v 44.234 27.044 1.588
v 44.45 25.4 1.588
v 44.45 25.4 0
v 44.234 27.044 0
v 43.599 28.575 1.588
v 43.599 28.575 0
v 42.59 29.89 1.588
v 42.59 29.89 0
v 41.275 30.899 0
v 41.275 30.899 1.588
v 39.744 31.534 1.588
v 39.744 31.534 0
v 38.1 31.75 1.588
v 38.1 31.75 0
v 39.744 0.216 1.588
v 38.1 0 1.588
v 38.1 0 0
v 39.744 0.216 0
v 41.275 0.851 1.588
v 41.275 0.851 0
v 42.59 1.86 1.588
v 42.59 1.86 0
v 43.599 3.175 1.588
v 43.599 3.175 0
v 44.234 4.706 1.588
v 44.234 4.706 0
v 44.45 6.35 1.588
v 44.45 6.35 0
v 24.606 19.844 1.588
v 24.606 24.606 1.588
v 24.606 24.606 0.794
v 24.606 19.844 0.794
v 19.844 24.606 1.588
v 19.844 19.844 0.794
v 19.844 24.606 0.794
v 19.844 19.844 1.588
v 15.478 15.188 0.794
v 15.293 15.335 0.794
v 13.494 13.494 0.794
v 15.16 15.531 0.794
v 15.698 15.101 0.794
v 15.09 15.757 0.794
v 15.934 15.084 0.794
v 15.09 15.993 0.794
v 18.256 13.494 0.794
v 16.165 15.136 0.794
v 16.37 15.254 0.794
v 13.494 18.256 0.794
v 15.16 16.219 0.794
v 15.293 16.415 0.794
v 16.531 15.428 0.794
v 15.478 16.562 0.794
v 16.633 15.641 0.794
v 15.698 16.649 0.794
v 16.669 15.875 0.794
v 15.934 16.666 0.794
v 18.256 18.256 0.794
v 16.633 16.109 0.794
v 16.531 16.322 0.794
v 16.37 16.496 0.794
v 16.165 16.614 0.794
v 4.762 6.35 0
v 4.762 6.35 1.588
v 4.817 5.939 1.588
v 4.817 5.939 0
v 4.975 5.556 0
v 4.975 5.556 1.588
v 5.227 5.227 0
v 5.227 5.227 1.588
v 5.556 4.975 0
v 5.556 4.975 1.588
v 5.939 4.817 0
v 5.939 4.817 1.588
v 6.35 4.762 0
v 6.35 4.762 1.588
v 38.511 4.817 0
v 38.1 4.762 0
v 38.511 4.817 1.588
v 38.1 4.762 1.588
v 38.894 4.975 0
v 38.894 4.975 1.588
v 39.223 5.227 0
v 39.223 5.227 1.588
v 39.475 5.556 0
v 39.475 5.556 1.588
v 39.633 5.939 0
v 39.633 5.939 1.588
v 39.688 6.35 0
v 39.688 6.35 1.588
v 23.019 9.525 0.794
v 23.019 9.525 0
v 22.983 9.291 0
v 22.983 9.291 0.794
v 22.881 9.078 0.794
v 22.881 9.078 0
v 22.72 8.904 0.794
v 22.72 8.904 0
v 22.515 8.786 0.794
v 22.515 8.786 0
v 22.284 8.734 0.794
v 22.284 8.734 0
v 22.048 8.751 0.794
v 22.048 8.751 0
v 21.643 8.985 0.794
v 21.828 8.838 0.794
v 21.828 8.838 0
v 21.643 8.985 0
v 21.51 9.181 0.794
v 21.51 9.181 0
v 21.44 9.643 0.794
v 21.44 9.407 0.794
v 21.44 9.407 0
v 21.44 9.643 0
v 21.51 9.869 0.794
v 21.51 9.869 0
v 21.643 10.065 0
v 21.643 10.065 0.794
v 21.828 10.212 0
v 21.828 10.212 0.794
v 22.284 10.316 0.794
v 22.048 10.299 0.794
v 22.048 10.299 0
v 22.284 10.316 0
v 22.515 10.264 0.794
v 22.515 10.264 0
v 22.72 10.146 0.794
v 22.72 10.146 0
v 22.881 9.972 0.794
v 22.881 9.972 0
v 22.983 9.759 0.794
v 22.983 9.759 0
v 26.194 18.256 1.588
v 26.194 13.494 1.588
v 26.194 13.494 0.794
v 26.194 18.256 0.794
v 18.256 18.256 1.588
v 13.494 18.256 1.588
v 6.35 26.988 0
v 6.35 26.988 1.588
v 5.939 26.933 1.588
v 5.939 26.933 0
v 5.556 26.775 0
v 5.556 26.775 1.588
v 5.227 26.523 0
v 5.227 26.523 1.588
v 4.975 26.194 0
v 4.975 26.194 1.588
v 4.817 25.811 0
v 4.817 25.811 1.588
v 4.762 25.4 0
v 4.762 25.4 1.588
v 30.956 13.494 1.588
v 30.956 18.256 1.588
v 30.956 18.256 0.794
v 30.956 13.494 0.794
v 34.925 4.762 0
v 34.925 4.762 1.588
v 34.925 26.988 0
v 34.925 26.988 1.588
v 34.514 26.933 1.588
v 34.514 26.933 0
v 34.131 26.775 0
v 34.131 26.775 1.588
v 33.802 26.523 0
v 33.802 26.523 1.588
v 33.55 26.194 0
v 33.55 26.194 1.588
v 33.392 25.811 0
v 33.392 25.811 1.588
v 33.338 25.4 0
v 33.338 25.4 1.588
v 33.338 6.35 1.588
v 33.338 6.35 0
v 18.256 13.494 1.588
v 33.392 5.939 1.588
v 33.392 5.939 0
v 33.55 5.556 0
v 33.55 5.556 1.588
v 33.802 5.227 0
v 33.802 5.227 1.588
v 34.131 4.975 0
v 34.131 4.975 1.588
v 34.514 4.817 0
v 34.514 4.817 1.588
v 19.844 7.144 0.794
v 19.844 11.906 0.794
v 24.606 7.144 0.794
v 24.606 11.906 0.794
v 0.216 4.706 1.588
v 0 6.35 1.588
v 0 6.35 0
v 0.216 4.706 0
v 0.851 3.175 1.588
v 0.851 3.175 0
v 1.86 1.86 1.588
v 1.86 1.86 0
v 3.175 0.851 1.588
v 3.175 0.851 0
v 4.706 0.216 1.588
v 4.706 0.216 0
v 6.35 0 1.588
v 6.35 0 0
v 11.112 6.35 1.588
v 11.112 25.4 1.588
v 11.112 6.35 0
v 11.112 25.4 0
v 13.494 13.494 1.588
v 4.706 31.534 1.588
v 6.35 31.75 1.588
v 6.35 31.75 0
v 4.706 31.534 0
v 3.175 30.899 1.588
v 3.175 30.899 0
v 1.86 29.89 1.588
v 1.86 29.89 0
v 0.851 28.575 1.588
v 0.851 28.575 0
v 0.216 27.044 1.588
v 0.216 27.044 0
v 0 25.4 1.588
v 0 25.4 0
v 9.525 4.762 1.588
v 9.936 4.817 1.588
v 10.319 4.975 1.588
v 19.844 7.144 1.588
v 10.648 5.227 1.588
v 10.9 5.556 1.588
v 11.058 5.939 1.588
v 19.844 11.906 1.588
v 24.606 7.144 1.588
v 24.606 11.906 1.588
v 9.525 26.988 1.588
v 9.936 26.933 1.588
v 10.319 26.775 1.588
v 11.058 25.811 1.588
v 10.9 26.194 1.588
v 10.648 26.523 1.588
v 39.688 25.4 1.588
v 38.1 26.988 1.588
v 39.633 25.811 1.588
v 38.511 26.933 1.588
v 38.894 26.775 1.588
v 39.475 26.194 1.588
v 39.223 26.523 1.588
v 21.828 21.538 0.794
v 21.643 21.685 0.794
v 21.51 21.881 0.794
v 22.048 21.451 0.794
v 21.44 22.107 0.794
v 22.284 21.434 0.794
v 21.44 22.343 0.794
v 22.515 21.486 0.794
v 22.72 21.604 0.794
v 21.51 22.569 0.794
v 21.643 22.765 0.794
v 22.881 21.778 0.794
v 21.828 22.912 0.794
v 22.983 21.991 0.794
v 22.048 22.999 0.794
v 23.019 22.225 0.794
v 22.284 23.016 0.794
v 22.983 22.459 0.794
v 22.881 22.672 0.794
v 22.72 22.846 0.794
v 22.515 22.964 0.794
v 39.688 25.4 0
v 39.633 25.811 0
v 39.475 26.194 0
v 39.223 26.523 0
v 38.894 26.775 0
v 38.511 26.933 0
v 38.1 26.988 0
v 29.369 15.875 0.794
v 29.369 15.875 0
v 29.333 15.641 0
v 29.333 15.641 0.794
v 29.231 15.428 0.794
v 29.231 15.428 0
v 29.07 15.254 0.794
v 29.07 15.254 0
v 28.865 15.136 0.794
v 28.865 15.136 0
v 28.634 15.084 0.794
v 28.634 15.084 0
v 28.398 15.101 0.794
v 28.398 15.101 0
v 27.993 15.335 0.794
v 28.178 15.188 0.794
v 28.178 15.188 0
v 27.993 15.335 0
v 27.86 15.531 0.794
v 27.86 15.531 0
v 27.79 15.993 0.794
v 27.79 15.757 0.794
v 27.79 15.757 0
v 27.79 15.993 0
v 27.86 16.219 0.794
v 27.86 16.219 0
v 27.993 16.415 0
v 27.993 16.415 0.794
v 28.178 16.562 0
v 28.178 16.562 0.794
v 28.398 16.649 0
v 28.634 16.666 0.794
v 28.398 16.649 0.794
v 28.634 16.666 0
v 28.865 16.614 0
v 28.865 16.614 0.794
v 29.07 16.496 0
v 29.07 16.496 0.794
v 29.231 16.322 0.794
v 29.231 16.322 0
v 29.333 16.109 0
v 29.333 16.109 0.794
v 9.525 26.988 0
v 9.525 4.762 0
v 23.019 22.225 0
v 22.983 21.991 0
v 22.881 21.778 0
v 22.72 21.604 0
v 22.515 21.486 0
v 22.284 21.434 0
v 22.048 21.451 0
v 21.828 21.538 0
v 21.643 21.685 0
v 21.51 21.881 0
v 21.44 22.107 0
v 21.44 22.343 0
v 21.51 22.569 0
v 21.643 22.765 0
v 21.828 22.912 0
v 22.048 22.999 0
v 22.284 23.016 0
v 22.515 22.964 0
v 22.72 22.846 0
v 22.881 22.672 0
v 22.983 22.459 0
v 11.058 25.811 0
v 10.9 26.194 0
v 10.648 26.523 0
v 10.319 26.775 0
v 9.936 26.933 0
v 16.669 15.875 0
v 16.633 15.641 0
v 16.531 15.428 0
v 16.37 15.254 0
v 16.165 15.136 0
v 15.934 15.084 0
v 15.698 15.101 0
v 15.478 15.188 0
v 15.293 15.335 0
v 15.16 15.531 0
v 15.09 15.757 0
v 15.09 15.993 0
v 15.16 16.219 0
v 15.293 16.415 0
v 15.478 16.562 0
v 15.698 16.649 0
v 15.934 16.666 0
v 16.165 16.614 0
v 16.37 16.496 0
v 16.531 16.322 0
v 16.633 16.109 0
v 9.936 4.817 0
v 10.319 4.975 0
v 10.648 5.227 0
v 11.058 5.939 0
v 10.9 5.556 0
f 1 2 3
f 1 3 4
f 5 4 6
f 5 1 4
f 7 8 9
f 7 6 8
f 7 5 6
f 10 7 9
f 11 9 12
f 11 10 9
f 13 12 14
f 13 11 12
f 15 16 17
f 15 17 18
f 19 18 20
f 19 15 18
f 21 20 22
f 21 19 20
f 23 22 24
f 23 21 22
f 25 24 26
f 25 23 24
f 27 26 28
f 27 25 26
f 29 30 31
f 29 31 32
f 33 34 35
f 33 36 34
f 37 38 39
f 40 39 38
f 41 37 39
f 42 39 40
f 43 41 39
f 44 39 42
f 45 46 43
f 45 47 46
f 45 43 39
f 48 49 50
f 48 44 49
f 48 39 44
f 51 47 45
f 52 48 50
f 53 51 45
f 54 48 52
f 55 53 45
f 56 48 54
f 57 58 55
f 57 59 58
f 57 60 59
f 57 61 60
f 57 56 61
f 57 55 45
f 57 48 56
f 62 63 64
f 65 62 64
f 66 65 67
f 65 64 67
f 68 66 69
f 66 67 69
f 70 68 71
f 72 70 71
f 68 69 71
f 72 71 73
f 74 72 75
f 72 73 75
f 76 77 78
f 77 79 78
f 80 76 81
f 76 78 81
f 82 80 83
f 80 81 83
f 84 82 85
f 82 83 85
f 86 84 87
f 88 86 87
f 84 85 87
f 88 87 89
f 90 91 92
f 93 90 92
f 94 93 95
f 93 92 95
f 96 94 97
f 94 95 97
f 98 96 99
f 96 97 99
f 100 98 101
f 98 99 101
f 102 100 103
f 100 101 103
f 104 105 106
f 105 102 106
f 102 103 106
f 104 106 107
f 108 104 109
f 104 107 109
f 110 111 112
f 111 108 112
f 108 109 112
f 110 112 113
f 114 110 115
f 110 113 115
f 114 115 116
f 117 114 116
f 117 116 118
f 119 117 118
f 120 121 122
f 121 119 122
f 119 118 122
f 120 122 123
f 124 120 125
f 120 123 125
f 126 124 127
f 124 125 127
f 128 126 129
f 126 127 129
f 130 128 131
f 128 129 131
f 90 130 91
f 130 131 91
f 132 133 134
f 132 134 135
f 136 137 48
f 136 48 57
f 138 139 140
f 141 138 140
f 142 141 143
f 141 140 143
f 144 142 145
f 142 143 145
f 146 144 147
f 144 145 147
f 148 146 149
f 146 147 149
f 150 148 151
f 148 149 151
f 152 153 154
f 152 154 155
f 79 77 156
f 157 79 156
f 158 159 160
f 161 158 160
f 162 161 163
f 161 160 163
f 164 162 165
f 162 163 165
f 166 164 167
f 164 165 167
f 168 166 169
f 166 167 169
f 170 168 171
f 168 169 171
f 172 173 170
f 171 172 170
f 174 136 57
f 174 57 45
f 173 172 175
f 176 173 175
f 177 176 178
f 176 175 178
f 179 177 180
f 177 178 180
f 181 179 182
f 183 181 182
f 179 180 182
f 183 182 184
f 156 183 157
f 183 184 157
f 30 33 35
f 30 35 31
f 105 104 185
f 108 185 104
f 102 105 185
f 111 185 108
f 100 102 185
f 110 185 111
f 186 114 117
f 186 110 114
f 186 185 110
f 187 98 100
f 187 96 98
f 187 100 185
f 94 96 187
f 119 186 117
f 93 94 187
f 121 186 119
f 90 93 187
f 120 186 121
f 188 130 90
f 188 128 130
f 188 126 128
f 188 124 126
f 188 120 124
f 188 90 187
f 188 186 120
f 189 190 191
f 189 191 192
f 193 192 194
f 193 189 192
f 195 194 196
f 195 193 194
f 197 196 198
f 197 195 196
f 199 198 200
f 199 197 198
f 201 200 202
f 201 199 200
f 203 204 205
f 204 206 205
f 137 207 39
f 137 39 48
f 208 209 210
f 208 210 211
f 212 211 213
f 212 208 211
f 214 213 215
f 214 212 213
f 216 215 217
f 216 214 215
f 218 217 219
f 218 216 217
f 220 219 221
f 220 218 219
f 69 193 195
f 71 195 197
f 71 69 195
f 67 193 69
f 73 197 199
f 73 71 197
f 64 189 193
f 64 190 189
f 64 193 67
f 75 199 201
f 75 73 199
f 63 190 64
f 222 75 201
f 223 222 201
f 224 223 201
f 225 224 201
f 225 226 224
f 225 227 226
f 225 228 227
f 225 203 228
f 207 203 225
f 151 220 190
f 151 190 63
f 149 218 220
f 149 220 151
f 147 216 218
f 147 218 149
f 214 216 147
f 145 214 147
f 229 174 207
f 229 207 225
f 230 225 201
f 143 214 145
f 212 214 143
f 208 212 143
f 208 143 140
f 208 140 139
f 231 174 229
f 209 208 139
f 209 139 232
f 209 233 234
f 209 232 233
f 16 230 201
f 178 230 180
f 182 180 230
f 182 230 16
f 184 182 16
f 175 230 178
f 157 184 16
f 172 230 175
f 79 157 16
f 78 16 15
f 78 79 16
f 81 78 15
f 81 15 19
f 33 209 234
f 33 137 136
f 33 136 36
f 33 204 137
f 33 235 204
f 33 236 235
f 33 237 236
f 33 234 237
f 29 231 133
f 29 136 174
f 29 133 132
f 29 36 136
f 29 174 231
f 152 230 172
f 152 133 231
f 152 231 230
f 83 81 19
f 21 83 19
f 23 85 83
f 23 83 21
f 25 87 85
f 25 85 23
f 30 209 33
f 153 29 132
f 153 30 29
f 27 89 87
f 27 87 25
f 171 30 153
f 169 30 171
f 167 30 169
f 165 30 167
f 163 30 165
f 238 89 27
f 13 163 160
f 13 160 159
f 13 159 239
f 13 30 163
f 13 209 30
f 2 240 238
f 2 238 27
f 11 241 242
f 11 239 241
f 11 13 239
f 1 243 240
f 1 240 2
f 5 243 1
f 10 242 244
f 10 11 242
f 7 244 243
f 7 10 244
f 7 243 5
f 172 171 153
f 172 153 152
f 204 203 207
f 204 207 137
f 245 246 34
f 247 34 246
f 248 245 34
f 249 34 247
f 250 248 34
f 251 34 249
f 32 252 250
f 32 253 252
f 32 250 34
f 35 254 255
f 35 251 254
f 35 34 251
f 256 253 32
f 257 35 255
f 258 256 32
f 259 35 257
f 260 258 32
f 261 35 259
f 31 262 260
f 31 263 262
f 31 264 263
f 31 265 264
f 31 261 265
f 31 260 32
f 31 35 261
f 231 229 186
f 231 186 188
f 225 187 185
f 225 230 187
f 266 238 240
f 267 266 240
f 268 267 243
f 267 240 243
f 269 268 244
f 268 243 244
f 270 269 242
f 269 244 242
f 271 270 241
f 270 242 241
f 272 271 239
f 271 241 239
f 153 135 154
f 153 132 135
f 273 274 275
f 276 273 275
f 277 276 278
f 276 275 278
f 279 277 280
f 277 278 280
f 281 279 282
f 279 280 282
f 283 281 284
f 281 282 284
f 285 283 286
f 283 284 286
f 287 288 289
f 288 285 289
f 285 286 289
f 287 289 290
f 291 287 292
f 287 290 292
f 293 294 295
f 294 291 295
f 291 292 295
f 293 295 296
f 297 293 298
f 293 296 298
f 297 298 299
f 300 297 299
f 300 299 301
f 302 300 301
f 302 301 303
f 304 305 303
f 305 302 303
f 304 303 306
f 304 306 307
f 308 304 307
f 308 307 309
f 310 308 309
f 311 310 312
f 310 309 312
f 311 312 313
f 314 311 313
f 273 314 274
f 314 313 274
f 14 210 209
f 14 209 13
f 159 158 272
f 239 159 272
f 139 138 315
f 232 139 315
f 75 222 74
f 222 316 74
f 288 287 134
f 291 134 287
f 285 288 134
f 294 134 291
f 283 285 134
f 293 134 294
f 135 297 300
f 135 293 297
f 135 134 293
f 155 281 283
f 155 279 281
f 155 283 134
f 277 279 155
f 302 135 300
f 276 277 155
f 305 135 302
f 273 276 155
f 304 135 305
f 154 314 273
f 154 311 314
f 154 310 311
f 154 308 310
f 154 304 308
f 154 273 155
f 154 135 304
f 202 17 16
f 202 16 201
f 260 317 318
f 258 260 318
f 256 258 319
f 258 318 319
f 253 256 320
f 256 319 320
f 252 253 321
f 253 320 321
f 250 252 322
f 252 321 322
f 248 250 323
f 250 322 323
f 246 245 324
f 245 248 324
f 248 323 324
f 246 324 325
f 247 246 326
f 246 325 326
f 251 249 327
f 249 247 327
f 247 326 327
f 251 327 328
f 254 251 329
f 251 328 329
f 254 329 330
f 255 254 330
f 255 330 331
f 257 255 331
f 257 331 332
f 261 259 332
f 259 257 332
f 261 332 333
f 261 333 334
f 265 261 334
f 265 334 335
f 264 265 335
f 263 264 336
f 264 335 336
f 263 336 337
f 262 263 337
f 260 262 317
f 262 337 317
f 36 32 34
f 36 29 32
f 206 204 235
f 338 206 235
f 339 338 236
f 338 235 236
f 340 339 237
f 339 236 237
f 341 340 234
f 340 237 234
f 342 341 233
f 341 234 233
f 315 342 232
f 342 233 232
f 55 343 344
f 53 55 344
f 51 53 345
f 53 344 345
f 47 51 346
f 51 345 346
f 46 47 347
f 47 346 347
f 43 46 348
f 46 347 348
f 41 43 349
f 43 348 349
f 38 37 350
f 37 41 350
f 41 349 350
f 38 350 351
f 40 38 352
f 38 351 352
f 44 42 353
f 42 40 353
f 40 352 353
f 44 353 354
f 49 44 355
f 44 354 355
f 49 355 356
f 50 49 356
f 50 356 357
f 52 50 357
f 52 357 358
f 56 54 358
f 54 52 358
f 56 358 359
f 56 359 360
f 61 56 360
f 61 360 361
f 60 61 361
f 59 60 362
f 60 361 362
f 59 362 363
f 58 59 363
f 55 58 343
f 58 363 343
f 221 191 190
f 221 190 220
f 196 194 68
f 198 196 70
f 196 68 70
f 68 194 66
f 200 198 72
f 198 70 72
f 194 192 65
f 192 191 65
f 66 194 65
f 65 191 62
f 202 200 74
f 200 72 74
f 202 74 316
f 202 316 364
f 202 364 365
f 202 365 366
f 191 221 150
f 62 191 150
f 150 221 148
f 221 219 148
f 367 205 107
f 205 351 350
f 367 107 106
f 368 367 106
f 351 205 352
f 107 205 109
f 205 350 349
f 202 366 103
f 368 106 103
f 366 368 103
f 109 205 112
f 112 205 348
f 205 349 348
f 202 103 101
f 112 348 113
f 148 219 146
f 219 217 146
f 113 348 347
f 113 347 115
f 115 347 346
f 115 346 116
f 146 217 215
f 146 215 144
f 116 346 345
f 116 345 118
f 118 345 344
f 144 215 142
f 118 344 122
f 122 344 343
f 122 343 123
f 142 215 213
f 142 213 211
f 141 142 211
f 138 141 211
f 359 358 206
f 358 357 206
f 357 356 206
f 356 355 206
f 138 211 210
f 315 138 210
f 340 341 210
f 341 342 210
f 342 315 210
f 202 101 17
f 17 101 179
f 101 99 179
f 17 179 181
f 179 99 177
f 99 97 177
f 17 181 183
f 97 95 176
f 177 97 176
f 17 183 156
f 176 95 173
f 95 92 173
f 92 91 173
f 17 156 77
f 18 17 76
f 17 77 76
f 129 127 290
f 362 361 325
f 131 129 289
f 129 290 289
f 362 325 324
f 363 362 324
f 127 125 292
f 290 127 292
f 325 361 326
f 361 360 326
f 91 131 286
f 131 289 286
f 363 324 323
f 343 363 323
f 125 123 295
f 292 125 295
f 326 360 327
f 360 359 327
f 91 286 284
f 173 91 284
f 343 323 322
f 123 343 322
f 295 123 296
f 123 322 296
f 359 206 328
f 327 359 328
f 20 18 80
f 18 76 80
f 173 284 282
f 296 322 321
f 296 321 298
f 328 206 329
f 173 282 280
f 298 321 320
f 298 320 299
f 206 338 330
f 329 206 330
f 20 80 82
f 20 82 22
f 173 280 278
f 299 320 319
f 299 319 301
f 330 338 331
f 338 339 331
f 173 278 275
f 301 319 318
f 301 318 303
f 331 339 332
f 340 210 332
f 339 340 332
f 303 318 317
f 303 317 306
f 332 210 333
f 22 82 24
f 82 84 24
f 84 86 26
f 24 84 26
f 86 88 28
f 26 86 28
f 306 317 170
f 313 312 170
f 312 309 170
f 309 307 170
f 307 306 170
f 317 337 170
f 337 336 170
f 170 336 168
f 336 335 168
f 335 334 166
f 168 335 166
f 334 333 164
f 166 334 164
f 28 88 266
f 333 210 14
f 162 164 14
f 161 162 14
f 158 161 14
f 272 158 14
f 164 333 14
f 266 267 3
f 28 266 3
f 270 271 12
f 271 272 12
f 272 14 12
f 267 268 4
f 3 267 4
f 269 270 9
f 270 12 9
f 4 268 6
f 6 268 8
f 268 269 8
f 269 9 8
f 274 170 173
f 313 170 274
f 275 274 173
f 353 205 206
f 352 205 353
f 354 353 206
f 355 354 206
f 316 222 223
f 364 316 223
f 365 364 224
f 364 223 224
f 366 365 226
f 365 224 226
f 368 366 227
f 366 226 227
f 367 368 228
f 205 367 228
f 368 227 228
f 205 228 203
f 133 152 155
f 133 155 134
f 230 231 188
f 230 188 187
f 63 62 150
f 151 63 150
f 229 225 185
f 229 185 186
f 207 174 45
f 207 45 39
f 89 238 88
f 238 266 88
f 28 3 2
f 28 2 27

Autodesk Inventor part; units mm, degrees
ref_plane "YZ Plane" through (0, 0, 0) normal (1, 0, 0) x (0, 1, 0)
ref_plane "XZ Plane" through (0, 0, 0) normal (0, 1, 0) x (-1, 0, 0)
ref_plane "XY Plane" through (0, 0, 0) normal (0, 0, 1) x (1, 0, 0)
sketch "Sketch2" plane through (0, 0, 0) normal (0, 0, 1) x (1, 0, 0)
  line L0 (0, 31.75) -> (44.45, 31.75)
  line L1 (44.45, 31.75) -> (44.45, 0)
  line L2 (44.45, 0) -> (0, 0)
  line L3 (0, 0) -> (0, 31.75)
  circle A0 centre (22.225, 22.225) radius 0.7937
  circle A1 centre (22.225, 9.525) radius 0.7937
  circle A2 centre (28.575, 15.875) radius 0.7937
  circle A3 centre (15.875, 15.875) radius 0.7937
  line L4 (4.7625, 26.9875) -> (11.1125, 26.9875)
  line L5 (11.1125, 26.9875) -> (11.1125, 4.7625)
  line L6 (11.1125, 4.7625) -> (4.7625, 4.7625)
  line L7 (4.7625, 4.7625) -> (4.7625, 26.9875)
  line L8 (33.3375, 26.9875) -> (39.6875, 26.9875)
  line L9 (39.6875, 26.9875) -> (39.6875, 4.7625)
  line L10 (39.6875, 4.7625) -> (33.3375, 4.7625)
  line L11 (33.3375, 4.7625) -> (33.3375, 26.9875)
  dimension "d9" = 44.45
  dimension "d10" = 31.75
  dimension "d11" = 1.5875
  dimension "d12" = 1.5875
  dimension "d13" = 1.5875
  dimension "d14" = 1.5875
  dimension "d15" = 12.7
  dimension "d16" = 12.7
  dimension "d17" = 15.875
  dimension "d18" = 22.225
  dimension "d21" = 6.35
  dimension "d22" = 6.35
  dimension "d26" = 4.7625
  dimension "d27" = 4.7625
  dimension "d28" = 4.7625
  dimension "d29" = 4.7625
  dimension "d30" = 4.7625
  dimension "d31" = 4.7625
extrude "Extrusion4" add sketch "Sketch2" along normal blind 1.5875
fillet "Fillet2" radius 6.35 4 edges at (0, 31.75, 0.7937) (0, 0, 0.7937) (44.45, 0, 0.7937) (44.45, 31.75, 0.7937)
fillet "Fillet3" radius 1.5875 8 edges at (4.7625, 4.7625, 0.7937) (11.1125, 4.7625, 0.7937) (33.3375, 4.7625, 0.7937) (4.7625, 26.9875, 0.7937) (11.1125, 26.9875, 0.7937) (39.6875, 26.9875, 0.7937) (33.3375, 26.9875, 0.7937) (39.6875, 4.7625, 0.7937)
sketch "Sketch3" plane through (0, 0, 1.5875) normal (0, 0, 1) x (1, 0, 0)
  line L0 (13.4937, 18.2563) -> (18.2562, 18.2563)
  line L1 (18.2562, 18.2563) -> (18.2562, 13.4938)
  line L2 (18.2562, 13.4938) -> (13.4937, 13.4938)
  line L3 (13.4937, 13.4938) -> (13.4937, 18.2563)
  circle A0 centre (15.875, 15.875) radius 0.7937 projected
  line L4 (19.8437, 24.6063) -> (24.6062, 24.6063)
  line L5 (24.6062, 24.6063) -> (24.6062, 19.8438)
  line L6 (24.6062, 19.8438) -> (19.8437, 19.8438)
  line L7 (19.8437, 19.8438) -> (19.8437, 24.6063)
  line L8 (26.1937, 18.2563) -> (30.9562, 18.2563)
  line L9 (30.9562, 18.2563) -> (30.9562, 13.4938)
  line L10 (30.9562, 13.4938) -> (26.1937, 13.4938)
  line L11 (26.1937, 13.4938) -> (26.1937, 18.2563)
  line L12 (19.8437, 11.9063) -> (24.6062, 11.9063)
  line L13 (24.6062, 11.9063) -> (24.6062, 7.1438)
  line L14 (24.6062, 7.1438) -> (19.8437, 7.1438)
  line L15 (19.8437, 7.1438) -> (19.8437, 11.9063)
  circle A1 centre (22.225, 22.225) radius 0.7937 projected
  circle A2 centre (28.575, 15.875) radius 0.7937 projected
  circle A3 centre (22.225, 9.525) radius 0.7937 projected
  point P0 (0, 0)
  dimension "d36" = 4.7625
  dimension "d37" = 2.3813
  dimension "d38" = 2.3813
  dimension "d39" = 4.7625
  dimension "d41" = 2.3813
  dimension "d42" = 2.3813
  dimension "d43" = 2.3813
  dimension "d44" = 2.3813
  dimension "d45" = 2.3813
  dimension "d46" = 2.3813
extrude "Extrusion6" cut sketch "Sketch3" against normal blind 0.7937
equation "\"d12\" = d11"
equation "\"d13\" = d11"
equation "\"d14\" = d11"
equation "\"d17\" = 0.5 * d10"
equation "\"d18\" = 0.5 * d9"
equation "\"d28\" = d30"
equation "\"d29\" = d31"
equation "\"d37\" = 0.5 * d36"
equation "\"d38\" = 0.5 * d36"
equation "\"d39\" = d36"
equation "\"d41\" = d37"
equation "\"d42\" = d41"
equation "\"d43\" = d37"
equation "\"d44\" = d37"
equation "\"d45\" = d37"
equation "\"d46\" = d37"
properties part number "extender-plate"
